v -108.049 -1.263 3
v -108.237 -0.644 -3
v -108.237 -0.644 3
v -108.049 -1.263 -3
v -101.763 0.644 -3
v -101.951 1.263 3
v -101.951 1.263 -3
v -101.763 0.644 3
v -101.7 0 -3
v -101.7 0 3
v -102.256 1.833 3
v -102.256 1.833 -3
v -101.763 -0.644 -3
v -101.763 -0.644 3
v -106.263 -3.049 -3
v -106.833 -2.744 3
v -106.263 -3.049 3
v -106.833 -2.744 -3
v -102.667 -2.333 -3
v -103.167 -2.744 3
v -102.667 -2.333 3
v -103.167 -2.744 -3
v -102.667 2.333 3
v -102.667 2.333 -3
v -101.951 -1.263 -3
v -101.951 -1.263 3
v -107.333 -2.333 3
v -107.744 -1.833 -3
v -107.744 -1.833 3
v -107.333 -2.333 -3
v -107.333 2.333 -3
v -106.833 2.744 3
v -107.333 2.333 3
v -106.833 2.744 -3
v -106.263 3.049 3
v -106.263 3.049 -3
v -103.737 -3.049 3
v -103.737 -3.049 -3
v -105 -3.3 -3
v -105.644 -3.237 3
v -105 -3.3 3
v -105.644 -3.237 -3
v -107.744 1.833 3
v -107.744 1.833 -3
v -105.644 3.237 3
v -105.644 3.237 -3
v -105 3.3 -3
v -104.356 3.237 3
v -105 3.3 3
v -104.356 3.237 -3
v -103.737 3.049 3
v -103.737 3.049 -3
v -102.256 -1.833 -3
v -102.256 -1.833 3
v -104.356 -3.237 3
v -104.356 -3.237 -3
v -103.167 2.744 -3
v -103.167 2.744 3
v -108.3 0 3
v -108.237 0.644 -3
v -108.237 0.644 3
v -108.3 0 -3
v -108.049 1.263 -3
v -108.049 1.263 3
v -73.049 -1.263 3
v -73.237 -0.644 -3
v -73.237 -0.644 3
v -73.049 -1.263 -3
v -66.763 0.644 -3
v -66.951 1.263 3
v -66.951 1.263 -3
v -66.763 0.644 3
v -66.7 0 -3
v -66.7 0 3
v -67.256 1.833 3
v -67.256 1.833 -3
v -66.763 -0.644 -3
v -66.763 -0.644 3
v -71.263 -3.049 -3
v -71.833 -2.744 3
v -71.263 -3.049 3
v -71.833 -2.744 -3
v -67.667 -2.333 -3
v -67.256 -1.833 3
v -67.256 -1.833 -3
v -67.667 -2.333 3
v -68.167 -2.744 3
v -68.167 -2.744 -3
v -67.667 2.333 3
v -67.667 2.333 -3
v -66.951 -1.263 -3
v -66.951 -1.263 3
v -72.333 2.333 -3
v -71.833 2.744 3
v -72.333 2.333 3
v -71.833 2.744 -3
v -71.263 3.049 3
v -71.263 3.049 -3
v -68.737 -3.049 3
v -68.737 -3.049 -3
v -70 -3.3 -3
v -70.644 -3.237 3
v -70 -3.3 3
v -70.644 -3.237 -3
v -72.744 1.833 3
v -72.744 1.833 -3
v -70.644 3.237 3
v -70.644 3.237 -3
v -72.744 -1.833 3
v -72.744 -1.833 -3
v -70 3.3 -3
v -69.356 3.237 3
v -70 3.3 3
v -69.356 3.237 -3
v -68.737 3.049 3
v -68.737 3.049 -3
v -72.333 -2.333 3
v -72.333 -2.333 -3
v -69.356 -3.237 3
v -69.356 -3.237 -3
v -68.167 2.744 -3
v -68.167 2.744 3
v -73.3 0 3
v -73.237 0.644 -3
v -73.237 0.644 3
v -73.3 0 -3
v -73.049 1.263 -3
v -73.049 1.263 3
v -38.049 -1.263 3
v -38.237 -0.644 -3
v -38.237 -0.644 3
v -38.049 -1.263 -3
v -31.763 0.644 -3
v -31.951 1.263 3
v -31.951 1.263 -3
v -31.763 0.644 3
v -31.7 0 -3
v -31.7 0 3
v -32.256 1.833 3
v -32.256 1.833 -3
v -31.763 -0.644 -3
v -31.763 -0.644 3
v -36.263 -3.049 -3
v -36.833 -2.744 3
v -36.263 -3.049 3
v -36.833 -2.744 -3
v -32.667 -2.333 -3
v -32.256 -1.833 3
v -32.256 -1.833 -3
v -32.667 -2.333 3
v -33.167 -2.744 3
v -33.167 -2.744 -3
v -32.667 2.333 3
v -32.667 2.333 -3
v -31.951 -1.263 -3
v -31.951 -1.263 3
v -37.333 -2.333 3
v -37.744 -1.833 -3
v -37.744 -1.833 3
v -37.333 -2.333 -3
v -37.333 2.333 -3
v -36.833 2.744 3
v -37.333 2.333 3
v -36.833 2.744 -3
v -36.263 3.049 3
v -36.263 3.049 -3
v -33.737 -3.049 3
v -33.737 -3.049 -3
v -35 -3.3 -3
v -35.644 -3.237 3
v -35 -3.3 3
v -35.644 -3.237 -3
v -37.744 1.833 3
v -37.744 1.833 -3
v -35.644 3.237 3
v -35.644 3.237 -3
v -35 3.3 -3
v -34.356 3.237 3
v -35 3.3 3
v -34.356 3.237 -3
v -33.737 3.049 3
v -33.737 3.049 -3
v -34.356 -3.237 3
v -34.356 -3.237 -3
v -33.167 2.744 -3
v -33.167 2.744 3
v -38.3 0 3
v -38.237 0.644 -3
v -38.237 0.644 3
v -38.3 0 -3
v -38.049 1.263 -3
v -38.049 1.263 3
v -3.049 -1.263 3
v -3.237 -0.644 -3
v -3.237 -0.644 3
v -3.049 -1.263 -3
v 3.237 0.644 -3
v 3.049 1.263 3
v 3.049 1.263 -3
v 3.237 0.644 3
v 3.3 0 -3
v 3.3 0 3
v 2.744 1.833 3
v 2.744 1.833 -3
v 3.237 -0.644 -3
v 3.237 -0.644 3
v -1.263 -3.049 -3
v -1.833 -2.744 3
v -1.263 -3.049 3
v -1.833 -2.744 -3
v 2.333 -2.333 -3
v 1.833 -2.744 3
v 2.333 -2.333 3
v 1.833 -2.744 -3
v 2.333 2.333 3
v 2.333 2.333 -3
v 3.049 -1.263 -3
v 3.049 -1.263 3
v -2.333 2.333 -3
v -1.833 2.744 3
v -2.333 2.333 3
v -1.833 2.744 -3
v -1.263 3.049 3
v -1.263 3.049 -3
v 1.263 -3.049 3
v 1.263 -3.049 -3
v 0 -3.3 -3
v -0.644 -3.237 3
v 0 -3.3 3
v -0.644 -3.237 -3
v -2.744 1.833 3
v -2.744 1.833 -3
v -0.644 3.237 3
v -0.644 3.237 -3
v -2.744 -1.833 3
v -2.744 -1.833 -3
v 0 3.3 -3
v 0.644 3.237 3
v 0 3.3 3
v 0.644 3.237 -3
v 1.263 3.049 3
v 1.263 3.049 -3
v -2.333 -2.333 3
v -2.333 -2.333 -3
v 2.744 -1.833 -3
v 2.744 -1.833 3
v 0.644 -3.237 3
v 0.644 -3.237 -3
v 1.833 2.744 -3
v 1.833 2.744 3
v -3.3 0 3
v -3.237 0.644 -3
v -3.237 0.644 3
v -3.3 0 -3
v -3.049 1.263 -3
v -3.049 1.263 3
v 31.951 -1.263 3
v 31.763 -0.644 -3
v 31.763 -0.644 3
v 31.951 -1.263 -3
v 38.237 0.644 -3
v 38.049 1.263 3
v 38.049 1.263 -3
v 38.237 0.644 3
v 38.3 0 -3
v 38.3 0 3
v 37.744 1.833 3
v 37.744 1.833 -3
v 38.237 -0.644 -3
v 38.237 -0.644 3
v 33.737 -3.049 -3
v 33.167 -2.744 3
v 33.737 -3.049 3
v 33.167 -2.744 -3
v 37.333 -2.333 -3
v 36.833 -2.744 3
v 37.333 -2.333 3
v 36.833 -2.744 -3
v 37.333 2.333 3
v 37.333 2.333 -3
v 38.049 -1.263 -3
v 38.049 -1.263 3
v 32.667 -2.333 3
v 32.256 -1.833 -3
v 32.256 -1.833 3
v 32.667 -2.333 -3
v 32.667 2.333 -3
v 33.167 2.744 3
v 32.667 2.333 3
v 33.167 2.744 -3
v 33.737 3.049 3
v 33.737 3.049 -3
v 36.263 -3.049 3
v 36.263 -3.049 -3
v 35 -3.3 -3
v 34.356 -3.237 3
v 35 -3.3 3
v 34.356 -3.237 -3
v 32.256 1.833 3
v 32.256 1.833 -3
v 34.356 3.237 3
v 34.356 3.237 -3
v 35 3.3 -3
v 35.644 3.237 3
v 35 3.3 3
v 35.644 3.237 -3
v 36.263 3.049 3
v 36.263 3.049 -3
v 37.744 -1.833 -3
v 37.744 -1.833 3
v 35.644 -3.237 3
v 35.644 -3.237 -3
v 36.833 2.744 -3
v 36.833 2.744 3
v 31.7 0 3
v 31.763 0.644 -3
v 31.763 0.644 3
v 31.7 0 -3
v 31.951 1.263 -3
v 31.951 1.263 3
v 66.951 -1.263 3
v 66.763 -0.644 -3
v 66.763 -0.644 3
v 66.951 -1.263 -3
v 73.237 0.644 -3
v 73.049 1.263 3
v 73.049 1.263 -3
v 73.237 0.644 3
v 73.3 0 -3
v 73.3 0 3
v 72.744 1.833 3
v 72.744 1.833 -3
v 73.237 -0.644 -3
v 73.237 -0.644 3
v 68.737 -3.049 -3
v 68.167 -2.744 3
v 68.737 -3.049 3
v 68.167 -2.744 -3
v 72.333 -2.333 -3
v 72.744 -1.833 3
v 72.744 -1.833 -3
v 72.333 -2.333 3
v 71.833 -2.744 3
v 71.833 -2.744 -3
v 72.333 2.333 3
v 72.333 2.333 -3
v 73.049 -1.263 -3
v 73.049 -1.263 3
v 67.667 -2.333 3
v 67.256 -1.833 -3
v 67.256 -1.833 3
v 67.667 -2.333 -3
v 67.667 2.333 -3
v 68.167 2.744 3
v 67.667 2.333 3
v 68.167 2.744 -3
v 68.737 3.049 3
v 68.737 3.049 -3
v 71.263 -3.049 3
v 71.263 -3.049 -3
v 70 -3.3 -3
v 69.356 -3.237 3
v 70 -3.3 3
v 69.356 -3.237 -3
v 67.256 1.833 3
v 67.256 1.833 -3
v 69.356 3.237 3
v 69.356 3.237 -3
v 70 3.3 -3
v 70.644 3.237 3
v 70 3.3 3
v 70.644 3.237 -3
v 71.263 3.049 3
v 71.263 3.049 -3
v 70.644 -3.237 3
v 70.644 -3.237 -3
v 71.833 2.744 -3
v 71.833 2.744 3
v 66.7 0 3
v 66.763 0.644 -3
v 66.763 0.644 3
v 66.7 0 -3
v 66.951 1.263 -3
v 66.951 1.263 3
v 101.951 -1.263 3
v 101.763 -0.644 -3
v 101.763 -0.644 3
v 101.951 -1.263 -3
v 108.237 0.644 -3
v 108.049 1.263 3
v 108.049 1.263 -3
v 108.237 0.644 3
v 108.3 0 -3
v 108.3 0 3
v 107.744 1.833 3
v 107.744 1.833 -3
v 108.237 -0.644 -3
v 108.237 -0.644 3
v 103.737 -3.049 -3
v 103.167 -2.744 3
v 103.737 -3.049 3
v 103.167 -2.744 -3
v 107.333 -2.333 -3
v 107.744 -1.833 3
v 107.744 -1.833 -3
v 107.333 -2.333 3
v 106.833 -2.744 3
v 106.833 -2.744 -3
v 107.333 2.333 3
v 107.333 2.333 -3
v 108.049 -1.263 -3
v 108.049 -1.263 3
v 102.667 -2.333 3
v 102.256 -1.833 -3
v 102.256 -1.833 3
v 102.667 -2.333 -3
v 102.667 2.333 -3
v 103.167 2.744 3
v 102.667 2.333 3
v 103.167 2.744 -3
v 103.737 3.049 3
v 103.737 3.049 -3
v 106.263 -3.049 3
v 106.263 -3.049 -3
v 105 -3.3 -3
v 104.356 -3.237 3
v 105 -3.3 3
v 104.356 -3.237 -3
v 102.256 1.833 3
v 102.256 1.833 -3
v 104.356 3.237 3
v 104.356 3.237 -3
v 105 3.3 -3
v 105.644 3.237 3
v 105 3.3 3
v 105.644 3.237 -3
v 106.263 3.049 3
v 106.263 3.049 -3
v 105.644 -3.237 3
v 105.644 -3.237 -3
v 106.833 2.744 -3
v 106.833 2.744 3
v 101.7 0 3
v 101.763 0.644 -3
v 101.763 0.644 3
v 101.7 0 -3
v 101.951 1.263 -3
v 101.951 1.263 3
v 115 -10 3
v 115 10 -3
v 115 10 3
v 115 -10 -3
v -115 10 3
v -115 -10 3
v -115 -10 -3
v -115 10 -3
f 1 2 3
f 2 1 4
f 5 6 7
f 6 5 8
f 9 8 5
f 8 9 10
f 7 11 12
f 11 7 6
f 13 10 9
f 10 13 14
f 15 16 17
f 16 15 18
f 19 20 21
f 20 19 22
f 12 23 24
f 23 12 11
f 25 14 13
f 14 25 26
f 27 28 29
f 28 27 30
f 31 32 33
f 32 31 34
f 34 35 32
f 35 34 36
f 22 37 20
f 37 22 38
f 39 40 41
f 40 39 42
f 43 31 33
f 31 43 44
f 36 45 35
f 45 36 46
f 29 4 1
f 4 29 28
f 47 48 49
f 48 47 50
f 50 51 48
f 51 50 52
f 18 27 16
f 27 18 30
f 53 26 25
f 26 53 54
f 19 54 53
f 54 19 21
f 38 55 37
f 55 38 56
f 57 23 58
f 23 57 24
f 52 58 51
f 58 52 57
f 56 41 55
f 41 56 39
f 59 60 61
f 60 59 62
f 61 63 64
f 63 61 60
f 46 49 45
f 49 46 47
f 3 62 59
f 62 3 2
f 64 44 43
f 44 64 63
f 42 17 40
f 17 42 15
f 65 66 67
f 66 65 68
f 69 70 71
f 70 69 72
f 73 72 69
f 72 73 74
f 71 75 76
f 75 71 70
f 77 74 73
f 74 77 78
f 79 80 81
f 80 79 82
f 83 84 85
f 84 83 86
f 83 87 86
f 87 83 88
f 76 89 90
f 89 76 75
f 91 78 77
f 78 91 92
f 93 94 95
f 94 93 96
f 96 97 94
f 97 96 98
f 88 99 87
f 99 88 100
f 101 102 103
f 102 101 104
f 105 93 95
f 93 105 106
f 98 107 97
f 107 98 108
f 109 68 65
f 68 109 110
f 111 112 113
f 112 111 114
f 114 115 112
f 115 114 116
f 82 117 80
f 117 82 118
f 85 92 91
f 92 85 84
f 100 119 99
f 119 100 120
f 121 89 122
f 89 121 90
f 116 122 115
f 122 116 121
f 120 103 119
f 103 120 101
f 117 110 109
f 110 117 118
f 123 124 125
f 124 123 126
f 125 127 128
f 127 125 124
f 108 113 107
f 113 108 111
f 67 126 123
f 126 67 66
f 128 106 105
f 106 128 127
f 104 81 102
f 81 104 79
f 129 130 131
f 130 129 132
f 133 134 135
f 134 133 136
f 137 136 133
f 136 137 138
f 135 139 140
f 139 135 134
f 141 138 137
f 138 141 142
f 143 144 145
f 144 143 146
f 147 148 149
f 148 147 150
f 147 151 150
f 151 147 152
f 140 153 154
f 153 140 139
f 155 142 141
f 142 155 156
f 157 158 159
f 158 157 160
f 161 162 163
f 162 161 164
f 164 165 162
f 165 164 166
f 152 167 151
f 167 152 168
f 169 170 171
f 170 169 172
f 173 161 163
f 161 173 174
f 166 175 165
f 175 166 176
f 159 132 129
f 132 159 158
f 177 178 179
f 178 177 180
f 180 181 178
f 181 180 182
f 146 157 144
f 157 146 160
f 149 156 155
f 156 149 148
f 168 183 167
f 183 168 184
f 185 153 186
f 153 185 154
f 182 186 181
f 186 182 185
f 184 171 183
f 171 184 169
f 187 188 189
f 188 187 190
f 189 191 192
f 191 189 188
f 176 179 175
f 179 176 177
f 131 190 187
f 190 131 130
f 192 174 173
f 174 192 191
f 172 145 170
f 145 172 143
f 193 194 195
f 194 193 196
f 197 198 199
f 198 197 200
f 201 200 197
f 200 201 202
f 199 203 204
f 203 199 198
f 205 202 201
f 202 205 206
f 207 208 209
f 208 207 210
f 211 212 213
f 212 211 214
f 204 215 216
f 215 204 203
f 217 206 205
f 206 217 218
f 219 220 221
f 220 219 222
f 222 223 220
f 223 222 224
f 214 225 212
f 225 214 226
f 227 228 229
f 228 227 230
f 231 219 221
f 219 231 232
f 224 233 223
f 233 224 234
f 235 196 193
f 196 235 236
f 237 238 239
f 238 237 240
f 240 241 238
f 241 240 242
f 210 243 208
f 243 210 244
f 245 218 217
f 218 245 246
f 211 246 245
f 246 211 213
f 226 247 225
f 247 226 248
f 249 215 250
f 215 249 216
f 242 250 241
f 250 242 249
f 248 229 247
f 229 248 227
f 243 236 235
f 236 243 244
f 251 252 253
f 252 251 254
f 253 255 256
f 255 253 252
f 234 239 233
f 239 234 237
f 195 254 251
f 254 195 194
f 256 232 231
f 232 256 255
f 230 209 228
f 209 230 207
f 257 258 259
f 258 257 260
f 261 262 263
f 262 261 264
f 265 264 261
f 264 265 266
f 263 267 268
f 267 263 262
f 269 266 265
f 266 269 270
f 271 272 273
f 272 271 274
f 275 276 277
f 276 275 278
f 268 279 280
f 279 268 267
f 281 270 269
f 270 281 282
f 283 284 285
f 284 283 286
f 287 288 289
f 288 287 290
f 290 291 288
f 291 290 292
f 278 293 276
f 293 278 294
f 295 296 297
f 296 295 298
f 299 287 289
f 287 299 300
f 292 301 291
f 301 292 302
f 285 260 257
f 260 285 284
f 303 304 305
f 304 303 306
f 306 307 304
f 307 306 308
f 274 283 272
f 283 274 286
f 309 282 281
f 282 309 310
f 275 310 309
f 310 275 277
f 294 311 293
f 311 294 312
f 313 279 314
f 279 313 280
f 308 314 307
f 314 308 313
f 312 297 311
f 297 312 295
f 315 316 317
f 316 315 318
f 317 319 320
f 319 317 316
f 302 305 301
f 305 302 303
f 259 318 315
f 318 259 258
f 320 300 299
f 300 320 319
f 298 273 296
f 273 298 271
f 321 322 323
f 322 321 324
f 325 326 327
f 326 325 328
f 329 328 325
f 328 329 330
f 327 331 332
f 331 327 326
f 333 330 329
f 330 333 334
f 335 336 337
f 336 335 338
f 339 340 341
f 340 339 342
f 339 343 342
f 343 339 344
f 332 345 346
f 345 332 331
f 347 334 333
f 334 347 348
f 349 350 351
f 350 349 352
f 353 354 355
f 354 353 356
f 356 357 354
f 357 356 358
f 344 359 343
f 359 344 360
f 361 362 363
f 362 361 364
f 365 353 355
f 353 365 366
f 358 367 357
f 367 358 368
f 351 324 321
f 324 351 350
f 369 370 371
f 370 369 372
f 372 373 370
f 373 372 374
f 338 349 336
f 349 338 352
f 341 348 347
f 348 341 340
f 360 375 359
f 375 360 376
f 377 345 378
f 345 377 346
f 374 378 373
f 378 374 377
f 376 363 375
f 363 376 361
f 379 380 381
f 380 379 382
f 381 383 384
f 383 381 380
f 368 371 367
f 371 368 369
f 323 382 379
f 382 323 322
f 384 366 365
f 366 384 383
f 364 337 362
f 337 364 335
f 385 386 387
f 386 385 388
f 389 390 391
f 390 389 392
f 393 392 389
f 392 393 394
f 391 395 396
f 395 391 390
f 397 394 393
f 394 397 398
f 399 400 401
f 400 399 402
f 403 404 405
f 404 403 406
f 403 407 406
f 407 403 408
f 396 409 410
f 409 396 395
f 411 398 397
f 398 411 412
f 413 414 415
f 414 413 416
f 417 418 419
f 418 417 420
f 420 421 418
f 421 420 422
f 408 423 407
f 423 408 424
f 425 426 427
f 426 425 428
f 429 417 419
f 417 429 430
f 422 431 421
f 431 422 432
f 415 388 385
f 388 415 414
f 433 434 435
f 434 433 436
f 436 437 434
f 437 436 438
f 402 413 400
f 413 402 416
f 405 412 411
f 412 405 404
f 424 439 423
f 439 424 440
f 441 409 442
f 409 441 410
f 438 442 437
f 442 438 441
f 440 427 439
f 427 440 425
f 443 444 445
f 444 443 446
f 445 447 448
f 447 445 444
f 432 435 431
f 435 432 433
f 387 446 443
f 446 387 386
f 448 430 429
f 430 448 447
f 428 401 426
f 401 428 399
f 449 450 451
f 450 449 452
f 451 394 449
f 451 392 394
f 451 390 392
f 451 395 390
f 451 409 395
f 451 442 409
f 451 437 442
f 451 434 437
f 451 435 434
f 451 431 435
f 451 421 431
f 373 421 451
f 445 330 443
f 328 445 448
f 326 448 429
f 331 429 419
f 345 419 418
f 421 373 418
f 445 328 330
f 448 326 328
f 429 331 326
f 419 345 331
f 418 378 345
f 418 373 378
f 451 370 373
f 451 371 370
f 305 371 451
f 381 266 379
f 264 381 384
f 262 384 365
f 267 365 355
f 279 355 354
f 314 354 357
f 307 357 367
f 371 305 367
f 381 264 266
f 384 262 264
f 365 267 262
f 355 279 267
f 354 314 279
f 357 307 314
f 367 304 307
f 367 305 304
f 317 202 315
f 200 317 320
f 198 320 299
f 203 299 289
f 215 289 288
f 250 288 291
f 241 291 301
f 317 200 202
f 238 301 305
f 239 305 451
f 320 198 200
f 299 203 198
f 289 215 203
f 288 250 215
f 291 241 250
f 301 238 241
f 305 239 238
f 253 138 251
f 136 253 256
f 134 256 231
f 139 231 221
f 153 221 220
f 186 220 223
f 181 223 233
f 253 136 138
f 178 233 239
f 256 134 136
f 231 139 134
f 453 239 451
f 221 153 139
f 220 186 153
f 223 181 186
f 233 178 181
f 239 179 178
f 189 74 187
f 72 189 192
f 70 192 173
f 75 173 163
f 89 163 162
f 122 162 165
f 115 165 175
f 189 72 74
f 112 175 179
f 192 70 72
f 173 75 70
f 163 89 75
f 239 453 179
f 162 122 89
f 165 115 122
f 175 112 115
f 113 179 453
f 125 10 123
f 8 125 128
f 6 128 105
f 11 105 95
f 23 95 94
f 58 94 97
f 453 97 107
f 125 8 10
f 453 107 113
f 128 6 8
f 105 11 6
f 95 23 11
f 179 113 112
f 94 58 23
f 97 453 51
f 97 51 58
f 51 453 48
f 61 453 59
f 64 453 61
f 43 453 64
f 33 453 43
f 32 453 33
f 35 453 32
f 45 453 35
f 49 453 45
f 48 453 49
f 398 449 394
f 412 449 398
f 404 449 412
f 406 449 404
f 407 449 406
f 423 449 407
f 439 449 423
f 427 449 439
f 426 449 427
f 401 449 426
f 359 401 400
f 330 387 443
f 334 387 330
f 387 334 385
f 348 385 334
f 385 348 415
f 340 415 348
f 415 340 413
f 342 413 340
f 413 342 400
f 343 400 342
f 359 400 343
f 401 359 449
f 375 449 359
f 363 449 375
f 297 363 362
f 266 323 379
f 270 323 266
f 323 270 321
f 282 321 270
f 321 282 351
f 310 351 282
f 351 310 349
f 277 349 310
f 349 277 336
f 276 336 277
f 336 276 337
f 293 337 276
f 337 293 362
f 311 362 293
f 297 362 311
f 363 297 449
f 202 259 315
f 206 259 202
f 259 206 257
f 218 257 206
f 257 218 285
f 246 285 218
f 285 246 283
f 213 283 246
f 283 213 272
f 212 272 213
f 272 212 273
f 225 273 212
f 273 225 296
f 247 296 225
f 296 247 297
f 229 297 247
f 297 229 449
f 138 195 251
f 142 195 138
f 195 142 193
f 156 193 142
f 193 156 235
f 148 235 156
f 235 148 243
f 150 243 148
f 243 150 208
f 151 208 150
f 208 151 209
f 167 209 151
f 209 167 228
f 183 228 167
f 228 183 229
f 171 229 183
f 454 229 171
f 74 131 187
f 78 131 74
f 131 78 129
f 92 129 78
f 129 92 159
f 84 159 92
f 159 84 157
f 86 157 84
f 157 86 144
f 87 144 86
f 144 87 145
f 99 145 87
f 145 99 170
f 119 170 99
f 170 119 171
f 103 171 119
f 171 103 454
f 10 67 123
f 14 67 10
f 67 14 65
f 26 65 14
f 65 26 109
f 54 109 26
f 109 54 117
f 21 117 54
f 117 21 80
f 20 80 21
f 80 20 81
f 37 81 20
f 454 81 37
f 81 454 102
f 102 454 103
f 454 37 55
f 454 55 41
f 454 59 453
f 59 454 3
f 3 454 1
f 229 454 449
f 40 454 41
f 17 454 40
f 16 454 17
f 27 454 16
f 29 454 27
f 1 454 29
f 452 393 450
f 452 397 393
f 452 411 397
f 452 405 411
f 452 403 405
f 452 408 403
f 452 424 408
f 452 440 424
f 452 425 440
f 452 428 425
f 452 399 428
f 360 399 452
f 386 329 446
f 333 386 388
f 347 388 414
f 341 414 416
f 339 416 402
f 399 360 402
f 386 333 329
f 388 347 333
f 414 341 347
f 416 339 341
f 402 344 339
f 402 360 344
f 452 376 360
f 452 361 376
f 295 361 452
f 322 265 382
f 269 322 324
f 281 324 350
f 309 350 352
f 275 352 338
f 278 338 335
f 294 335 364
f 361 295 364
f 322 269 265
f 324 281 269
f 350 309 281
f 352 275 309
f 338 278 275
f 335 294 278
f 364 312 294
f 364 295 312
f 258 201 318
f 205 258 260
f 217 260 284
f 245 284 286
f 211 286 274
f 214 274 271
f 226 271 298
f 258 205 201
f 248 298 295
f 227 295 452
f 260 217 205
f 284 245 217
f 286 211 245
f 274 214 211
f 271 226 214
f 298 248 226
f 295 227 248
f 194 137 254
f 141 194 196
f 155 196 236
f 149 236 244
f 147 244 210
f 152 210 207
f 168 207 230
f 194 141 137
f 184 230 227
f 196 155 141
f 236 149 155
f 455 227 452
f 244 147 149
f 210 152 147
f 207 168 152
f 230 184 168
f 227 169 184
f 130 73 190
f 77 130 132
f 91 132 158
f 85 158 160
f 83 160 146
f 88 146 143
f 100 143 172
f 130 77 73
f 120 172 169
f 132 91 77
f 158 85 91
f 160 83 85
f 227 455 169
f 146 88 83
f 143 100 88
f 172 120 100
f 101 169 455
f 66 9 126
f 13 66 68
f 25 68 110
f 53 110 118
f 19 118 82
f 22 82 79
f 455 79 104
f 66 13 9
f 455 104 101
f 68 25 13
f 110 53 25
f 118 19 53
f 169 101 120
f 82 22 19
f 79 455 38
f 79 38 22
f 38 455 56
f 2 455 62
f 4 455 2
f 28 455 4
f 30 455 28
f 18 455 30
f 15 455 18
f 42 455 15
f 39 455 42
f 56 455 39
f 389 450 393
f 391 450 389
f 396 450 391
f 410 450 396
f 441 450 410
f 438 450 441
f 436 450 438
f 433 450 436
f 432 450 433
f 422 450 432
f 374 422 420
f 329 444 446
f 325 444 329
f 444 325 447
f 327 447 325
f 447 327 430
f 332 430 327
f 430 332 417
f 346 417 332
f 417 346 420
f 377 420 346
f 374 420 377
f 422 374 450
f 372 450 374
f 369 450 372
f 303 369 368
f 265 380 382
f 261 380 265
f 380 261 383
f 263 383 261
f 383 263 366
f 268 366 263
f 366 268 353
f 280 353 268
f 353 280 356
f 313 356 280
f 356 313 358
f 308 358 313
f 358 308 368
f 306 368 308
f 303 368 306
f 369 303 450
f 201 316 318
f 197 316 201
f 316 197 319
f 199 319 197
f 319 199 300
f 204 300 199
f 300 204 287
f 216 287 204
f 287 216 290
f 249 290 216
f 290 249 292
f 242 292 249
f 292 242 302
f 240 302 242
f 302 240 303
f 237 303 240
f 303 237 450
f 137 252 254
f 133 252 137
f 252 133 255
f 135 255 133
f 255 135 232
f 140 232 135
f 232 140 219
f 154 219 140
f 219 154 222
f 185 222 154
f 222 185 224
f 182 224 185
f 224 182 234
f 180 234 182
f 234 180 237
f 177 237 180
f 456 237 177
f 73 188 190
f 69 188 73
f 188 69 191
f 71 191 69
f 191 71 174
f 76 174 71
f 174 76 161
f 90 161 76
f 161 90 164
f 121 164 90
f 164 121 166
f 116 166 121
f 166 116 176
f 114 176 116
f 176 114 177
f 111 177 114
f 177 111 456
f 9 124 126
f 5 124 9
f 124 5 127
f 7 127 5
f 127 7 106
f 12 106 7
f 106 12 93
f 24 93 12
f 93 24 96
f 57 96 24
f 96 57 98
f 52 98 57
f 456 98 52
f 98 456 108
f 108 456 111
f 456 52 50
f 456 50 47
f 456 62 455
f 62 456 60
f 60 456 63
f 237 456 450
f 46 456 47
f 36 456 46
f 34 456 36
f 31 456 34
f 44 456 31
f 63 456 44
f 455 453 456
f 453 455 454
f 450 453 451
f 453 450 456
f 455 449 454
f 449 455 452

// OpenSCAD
$fn = 32;

// ----------------------------------------------------------------------
// Hole bar, 7 x Ø6.6
// row layout, 10 mm edge offset
// ----------------------------------------------------------------------

// --- parameters (mm) ---
bar_w = 20;    // bar width (Y)
bar_t = 6;     // bar thickness (Z)
holes = 7;     // holes per row
hole_d = 6.6;  // hole diameter
edge = 10;     // offset from the bar end to the first hole
pitch = 35;    // pitch between neighbouring holes

// --- derived feature positions (mm) ---
span = (holes - 1) * pitch;   // = 210   distance between the end holes
bar_l = span + 2 * edge;      // = 230   overall bar length
start_x = -bar_l / 2 + edge;  // = -105   X of the first hole
feature_centers = [
  [start_x + 0 * pitch, 0],
  [start_x + 1 * pitch, 0],
  [start_x + 2 * pitch, 0],
  [start_x + 3 * pitch, 0],
  [start_x + 4 * pitch, 0],
  [start_x + 5 * pitch, 0],
  [start_x + 6 * pitch, 0]
];   // hole centres of the first row

// bar with one row of holes, drilled from feature_centers
difference() {
  translate([-bar_l / 2, -bar_w / 2, -bar_t / 2]) cube([bar_l, bar_w, bar_t]);
  for (centre = feature_centers)
    translate([centre[0], centre[1], 0])
      cylinder(d = hole_d, h = bar_t + 2, center = true);
}
